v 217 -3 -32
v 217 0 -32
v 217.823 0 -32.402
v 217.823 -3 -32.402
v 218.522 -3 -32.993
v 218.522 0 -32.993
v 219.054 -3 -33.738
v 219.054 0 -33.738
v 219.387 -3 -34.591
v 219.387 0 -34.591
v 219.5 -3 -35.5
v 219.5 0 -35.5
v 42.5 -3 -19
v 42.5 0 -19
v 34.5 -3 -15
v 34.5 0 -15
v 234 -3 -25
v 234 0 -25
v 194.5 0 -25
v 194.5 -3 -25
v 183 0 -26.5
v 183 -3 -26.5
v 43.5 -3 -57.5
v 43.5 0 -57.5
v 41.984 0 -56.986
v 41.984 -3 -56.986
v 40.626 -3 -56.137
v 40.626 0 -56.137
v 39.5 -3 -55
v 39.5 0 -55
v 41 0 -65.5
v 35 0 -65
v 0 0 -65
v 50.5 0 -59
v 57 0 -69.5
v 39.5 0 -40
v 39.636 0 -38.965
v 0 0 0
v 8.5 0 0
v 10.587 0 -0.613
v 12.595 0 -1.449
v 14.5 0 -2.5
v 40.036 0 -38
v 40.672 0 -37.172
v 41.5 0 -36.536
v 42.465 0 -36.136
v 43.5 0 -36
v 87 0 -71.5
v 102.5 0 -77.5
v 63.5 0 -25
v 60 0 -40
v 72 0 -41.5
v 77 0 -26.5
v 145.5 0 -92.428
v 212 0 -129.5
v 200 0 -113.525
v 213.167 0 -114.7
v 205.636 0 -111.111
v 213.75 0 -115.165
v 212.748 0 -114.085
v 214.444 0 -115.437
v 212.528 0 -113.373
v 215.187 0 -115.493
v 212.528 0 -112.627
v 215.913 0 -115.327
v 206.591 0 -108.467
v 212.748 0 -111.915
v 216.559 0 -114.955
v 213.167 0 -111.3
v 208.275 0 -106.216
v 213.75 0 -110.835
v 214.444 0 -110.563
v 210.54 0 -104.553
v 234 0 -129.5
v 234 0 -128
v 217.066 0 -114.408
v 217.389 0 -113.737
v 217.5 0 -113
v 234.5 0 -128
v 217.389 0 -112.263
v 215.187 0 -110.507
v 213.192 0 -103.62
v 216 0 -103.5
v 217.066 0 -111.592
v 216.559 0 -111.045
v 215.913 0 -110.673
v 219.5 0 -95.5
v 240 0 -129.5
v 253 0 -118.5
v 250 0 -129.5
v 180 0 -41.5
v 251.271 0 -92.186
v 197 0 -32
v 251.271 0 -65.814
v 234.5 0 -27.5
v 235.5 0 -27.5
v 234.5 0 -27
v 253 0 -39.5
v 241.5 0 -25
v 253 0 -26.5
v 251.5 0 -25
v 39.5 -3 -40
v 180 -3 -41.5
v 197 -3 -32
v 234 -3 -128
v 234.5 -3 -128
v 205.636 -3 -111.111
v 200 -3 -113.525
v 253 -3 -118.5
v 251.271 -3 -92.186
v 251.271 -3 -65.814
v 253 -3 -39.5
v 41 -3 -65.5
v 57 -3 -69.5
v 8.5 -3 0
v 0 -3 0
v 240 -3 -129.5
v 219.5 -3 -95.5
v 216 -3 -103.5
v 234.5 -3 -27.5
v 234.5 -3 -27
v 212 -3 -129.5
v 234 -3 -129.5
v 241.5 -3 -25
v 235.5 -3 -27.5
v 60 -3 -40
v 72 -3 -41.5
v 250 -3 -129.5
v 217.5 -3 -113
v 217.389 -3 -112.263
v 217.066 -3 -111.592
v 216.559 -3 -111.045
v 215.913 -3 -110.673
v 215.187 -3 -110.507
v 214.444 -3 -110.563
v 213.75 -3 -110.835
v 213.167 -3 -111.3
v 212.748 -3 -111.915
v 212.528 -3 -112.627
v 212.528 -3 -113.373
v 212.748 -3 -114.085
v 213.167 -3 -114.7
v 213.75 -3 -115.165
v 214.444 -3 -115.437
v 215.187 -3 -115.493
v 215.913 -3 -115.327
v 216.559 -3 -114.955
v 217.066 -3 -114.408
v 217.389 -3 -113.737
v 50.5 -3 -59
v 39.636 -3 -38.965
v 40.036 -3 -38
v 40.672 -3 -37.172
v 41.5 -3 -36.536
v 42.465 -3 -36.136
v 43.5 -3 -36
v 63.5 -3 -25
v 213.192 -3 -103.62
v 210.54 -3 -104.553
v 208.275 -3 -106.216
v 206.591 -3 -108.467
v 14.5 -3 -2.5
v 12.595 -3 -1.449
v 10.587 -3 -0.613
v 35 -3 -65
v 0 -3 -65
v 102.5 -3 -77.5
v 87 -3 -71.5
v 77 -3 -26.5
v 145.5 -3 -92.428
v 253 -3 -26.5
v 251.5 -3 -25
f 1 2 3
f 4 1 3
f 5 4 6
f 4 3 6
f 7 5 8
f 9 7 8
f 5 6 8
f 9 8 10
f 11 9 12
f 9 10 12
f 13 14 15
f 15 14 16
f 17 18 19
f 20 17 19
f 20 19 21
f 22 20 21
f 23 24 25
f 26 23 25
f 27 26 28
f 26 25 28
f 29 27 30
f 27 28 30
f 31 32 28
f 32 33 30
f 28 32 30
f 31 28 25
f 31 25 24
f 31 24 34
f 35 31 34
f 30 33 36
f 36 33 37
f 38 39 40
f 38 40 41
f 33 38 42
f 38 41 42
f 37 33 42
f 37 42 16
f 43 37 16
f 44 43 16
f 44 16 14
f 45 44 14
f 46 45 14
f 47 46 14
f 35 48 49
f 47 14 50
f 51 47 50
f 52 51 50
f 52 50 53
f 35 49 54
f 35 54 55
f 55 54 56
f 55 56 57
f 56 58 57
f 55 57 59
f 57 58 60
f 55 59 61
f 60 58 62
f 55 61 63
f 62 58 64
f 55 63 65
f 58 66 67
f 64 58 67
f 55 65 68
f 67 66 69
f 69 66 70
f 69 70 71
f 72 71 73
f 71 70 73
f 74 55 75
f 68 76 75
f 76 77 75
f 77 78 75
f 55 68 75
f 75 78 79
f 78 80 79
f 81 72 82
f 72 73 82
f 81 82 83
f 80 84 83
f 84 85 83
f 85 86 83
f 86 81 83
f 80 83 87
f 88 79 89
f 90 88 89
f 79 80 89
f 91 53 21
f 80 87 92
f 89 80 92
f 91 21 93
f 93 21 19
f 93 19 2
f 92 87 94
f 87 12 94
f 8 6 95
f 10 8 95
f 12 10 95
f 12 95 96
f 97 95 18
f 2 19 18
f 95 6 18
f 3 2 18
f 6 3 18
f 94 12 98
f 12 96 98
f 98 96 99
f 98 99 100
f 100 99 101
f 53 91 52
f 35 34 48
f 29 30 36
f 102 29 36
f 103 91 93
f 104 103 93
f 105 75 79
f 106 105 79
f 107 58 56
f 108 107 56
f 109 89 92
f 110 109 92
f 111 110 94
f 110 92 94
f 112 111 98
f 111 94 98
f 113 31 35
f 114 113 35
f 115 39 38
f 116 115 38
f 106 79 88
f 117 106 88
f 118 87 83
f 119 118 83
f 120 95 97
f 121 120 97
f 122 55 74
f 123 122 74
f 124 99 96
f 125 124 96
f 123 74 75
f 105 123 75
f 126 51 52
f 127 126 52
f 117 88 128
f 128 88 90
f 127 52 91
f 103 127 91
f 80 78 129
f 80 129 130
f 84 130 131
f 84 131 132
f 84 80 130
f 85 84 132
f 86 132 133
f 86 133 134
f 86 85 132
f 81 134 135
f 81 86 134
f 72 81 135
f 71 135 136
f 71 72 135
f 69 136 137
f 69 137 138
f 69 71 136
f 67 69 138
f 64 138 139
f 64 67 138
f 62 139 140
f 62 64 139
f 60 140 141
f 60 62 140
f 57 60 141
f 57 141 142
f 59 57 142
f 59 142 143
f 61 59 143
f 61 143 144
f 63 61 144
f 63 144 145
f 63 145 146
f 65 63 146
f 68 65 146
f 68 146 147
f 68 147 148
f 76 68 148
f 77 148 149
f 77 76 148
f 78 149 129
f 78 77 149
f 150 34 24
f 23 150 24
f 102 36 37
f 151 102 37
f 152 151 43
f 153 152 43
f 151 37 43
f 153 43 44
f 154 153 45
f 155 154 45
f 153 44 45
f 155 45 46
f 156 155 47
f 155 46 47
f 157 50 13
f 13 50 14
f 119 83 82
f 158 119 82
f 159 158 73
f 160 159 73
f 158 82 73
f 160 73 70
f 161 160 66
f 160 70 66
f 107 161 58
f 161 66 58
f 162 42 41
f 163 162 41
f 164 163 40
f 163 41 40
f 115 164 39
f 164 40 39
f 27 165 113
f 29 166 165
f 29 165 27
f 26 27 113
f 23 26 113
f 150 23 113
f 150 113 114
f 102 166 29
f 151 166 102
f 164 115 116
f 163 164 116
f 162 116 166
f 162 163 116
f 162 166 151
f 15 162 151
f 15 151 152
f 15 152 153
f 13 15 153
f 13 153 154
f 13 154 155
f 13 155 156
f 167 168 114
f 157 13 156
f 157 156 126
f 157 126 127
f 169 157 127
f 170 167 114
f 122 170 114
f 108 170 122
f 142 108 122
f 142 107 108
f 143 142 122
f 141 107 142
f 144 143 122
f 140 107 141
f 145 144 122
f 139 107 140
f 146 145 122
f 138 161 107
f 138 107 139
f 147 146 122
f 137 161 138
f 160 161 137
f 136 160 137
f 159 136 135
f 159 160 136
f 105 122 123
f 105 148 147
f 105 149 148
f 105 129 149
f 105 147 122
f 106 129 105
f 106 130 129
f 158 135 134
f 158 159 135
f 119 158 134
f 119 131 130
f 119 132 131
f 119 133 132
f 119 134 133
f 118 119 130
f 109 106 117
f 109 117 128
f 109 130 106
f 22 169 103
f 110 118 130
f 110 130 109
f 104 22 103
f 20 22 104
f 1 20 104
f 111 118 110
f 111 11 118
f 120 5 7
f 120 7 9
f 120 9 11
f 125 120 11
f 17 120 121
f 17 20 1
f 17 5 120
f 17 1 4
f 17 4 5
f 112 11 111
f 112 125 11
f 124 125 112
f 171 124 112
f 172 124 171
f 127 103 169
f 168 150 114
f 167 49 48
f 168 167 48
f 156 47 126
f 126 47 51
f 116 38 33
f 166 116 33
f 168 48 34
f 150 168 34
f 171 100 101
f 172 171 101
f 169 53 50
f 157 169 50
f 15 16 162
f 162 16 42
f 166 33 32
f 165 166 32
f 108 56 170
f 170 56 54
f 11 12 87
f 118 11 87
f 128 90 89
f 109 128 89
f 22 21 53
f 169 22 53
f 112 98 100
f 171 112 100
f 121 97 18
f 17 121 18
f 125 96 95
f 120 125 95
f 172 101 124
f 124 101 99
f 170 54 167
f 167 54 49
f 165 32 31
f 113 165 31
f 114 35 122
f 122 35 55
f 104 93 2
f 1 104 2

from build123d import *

# Parameters (mm, degrees)
F0_R     = 2.5
F1_DEPTH = 3


with BuildPart() as f1:
    # F0 (on Front) → F1 (new body)
    with BuildSketch(Plane.XZ):
        with BuildLine():
            Line((8.5, 0), (0, 0))
            Line((0, 0), (0, -65))
            Line((0, -65), (35, -65))
            Line((35, -65), (41, -65.5))
            Line((41, -65.5), (57, -69.5))
            Line((57, -69.5), (212, -129.5))
            Line((212, -129.5), (234, -129.5))
            Line((234, -129.5), (234, -128))
            Line((234, -128), (234.5, -128))
            Line((234.5, -128), (240, -129.5))
            Line((240, -129.5), (250, -129.5))
            Line((250, -129.5), (253, -118.5))
            ThreePointArc((253, -118.5), (251.054419, -79), (253, -39.5))
            Line((253, -39.5), (253, -26.5))
            Line((253, -26.5), (251.5, -25))
            Line((251.5, -25), (241.5, -25))
            Line((241.5, -25), (235.5, -27.5))
            Line((235.5, -27.5), (234.5, -27.5))
            Line((234.5, -27.5), (234.5, -27))
            Line((234.5, -27), (234, -25))
            Line((234, -25), (194.5, -25))
            Line((194.5, -25), (183, -26.5))
            Line((183, -26.5), (77, -26.5))
            Line((77, -26.5), (63.5, -25))
            Line((63.5, -25), (42.5, -19))
            Line((42.5, -19), (34.5, -15))
            Line((34.5, -15), (14.5, -2.5))
            ThreePointArc((14.5, -2.5), (11.60261, -1.003737), (8.5, 0))
        make_face()
        with Locations((215, -113)):
            Circle(F0_R, mode=Mode.SUBTRACT)
        with BuildLine():
            Line((77, -41.5), (87, -41.5))
            Line((87, -41.5), (113, -41.5))
            Line((113, -41.5), (138, -41.5))
            Line((138, -41.5), (180, -41.5))
            Line((180, -41.5), (197, -32))
            Line((197, -32), (217, -32))
            ThreePointArc((217, -32), (218.810814, -33.349419), (219.5, -35.5))
            Line((219.5, -35.5), (219.5, -95.5))
            Line((219.5, -95.5), (216, -103.5))
            ThreePointArc((216, -103.5), (209.345929, -105.300553), (205.636229, -111.110611))
            Line((205.636229, -111.110611), (200, -113.524611))
            Line((200, -113.524611), (145.5, -92.427837))
            Line((145.5, -92.427837), (102.5, -77.5))
            Line((102.5, -77.5), (87, -71.5))
            Line((87, -71.5), (50.5, -59))
            Line((50.5, -59), (43.5, -57.5))
            ThreePointArc((43.5, -57.5), (41.280596, -56.601046), (39.5, -55))
            Line((39.5, -55), (39.5, -40))
            ThreePointArc((39.5, -40), (40.671573, -37.171573), (43.5, -36))
            Line((43.5, -36), (60, -40))
            Line((60, -40), (72, -41.5))
            Line((72, -41.5), (77, -41.5))
        make_face(mode=Mode.SUBTRACT)
    extrude(amount=F1_DEPTH)


solid = f1.part
